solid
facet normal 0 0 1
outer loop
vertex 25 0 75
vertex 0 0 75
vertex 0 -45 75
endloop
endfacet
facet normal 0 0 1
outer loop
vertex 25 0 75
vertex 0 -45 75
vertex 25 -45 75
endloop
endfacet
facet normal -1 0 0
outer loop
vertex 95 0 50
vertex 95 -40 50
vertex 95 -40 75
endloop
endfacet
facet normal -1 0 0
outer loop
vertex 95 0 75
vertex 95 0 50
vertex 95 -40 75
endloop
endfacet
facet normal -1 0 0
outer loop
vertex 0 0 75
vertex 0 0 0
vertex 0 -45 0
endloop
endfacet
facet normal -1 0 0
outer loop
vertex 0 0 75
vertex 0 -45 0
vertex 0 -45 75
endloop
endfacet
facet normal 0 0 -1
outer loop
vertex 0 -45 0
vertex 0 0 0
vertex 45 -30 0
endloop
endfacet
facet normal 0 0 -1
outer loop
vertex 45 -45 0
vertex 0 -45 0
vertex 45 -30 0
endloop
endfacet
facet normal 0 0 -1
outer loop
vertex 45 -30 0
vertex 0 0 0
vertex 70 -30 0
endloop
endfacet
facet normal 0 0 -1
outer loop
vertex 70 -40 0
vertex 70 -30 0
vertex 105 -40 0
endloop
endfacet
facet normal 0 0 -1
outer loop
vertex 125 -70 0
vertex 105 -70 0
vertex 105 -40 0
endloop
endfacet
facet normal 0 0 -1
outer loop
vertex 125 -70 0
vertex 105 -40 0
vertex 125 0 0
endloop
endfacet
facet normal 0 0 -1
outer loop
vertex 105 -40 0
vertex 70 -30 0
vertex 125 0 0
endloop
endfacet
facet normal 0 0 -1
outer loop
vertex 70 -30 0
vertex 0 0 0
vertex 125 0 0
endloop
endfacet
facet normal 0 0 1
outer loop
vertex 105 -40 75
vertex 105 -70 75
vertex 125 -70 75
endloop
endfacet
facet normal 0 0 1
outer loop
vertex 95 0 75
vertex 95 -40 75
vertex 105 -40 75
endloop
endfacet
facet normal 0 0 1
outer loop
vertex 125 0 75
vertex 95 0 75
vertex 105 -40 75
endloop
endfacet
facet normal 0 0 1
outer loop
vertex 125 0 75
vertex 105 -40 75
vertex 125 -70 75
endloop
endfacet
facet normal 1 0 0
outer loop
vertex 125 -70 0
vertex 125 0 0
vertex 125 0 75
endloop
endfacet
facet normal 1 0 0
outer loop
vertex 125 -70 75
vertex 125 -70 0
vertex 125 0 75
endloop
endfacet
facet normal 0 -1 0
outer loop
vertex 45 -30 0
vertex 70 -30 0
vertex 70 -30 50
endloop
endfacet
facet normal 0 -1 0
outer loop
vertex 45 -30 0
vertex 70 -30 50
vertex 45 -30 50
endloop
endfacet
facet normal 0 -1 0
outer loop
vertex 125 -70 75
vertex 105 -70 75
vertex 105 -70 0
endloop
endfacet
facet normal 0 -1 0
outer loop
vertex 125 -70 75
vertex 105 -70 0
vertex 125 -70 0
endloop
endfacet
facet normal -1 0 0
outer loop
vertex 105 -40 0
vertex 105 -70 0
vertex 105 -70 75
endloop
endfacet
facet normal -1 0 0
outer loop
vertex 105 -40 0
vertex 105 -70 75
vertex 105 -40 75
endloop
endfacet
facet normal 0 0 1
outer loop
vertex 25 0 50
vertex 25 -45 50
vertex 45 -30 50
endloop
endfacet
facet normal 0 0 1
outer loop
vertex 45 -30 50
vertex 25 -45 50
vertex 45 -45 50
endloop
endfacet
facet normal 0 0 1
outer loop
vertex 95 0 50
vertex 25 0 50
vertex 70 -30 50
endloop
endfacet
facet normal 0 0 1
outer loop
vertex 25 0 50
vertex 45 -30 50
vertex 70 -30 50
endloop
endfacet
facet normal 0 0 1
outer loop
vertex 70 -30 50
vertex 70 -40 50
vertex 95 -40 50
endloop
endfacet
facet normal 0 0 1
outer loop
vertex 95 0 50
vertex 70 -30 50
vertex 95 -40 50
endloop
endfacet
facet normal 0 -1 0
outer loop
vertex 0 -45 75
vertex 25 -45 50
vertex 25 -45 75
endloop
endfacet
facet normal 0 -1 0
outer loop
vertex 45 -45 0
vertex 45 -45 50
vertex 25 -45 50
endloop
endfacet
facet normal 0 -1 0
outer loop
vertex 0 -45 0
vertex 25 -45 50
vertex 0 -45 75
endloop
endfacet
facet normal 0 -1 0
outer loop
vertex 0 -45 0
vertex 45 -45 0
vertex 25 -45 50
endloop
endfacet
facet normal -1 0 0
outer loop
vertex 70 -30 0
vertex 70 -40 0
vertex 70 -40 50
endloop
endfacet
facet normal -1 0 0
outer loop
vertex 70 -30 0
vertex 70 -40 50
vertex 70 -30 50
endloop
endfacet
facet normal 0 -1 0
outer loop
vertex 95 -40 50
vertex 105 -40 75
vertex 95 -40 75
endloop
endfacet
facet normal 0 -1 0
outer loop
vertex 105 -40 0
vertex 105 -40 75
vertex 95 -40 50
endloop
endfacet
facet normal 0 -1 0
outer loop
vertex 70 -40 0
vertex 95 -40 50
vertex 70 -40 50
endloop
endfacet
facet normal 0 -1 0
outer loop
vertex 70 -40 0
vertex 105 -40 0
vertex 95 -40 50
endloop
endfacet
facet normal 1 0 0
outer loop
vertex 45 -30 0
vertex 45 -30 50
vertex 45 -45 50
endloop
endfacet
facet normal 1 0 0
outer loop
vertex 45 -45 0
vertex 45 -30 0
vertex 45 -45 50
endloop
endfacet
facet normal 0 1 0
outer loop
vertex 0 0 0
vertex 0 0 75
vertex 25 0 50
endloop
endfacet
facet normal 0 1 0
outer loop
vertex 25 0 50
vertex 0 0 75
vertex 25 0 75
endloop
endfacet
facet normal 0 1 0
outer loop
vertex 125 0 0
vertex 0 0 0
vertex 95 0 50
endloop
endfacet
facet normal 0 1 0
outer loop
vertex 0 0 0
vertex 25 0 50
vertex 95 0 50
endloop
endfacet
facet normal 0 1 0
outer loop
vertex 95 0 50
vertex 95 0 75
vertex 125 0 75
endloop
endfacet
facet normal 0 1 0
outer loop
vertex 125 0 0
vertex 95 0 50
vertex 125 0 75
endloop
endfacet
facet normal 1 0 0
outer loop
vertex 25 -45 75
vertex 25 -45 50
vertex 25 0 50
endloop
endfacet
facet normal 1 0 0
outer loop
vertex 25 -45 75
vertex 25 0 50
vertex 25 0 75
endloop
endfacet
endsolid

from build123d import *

# Parameters (mm, degrees)
F0_W     = 125
F0_H     = 75
F1_DEPTH = 70
F2_W     = 70
F2_H     = 25
F3_DEPTH = 70.001
F5_DEPTH = 75.001


with BuildPart() as f1:
    # F0 (on Front) → F1 (new body)
    with BuildSketch(Plane.XZ):
        with Locations((62.5, 37.5)):
            Rectangle(F0_W, F0_H)
    extrude(amount=F1_DEPTH)

    # F2 (on face) → F3 (cut, through all)
    with BuildSketch(Plane.XZ.offset(70)):
        with Locations((60, 62.5)):
            Rectangle(F2_W, F2_H)
    extrude(amount=-F3_DEPTH, mode=Mode.SUBTRACT)

    # F4 (on Top) → F5 (cut, through all)
    with BuildSketch(Plane.XY):
        Polygon((105, -118.377747), (105, -70), (105, -40), (70, -40), (70, -30), (45, -30), (45, -45), (0, -45), (0, -118.377747), align=None)
    extrude(amount=F5_DEPTH, mode=Mode.SUBTRACT)


solid = f1.part
